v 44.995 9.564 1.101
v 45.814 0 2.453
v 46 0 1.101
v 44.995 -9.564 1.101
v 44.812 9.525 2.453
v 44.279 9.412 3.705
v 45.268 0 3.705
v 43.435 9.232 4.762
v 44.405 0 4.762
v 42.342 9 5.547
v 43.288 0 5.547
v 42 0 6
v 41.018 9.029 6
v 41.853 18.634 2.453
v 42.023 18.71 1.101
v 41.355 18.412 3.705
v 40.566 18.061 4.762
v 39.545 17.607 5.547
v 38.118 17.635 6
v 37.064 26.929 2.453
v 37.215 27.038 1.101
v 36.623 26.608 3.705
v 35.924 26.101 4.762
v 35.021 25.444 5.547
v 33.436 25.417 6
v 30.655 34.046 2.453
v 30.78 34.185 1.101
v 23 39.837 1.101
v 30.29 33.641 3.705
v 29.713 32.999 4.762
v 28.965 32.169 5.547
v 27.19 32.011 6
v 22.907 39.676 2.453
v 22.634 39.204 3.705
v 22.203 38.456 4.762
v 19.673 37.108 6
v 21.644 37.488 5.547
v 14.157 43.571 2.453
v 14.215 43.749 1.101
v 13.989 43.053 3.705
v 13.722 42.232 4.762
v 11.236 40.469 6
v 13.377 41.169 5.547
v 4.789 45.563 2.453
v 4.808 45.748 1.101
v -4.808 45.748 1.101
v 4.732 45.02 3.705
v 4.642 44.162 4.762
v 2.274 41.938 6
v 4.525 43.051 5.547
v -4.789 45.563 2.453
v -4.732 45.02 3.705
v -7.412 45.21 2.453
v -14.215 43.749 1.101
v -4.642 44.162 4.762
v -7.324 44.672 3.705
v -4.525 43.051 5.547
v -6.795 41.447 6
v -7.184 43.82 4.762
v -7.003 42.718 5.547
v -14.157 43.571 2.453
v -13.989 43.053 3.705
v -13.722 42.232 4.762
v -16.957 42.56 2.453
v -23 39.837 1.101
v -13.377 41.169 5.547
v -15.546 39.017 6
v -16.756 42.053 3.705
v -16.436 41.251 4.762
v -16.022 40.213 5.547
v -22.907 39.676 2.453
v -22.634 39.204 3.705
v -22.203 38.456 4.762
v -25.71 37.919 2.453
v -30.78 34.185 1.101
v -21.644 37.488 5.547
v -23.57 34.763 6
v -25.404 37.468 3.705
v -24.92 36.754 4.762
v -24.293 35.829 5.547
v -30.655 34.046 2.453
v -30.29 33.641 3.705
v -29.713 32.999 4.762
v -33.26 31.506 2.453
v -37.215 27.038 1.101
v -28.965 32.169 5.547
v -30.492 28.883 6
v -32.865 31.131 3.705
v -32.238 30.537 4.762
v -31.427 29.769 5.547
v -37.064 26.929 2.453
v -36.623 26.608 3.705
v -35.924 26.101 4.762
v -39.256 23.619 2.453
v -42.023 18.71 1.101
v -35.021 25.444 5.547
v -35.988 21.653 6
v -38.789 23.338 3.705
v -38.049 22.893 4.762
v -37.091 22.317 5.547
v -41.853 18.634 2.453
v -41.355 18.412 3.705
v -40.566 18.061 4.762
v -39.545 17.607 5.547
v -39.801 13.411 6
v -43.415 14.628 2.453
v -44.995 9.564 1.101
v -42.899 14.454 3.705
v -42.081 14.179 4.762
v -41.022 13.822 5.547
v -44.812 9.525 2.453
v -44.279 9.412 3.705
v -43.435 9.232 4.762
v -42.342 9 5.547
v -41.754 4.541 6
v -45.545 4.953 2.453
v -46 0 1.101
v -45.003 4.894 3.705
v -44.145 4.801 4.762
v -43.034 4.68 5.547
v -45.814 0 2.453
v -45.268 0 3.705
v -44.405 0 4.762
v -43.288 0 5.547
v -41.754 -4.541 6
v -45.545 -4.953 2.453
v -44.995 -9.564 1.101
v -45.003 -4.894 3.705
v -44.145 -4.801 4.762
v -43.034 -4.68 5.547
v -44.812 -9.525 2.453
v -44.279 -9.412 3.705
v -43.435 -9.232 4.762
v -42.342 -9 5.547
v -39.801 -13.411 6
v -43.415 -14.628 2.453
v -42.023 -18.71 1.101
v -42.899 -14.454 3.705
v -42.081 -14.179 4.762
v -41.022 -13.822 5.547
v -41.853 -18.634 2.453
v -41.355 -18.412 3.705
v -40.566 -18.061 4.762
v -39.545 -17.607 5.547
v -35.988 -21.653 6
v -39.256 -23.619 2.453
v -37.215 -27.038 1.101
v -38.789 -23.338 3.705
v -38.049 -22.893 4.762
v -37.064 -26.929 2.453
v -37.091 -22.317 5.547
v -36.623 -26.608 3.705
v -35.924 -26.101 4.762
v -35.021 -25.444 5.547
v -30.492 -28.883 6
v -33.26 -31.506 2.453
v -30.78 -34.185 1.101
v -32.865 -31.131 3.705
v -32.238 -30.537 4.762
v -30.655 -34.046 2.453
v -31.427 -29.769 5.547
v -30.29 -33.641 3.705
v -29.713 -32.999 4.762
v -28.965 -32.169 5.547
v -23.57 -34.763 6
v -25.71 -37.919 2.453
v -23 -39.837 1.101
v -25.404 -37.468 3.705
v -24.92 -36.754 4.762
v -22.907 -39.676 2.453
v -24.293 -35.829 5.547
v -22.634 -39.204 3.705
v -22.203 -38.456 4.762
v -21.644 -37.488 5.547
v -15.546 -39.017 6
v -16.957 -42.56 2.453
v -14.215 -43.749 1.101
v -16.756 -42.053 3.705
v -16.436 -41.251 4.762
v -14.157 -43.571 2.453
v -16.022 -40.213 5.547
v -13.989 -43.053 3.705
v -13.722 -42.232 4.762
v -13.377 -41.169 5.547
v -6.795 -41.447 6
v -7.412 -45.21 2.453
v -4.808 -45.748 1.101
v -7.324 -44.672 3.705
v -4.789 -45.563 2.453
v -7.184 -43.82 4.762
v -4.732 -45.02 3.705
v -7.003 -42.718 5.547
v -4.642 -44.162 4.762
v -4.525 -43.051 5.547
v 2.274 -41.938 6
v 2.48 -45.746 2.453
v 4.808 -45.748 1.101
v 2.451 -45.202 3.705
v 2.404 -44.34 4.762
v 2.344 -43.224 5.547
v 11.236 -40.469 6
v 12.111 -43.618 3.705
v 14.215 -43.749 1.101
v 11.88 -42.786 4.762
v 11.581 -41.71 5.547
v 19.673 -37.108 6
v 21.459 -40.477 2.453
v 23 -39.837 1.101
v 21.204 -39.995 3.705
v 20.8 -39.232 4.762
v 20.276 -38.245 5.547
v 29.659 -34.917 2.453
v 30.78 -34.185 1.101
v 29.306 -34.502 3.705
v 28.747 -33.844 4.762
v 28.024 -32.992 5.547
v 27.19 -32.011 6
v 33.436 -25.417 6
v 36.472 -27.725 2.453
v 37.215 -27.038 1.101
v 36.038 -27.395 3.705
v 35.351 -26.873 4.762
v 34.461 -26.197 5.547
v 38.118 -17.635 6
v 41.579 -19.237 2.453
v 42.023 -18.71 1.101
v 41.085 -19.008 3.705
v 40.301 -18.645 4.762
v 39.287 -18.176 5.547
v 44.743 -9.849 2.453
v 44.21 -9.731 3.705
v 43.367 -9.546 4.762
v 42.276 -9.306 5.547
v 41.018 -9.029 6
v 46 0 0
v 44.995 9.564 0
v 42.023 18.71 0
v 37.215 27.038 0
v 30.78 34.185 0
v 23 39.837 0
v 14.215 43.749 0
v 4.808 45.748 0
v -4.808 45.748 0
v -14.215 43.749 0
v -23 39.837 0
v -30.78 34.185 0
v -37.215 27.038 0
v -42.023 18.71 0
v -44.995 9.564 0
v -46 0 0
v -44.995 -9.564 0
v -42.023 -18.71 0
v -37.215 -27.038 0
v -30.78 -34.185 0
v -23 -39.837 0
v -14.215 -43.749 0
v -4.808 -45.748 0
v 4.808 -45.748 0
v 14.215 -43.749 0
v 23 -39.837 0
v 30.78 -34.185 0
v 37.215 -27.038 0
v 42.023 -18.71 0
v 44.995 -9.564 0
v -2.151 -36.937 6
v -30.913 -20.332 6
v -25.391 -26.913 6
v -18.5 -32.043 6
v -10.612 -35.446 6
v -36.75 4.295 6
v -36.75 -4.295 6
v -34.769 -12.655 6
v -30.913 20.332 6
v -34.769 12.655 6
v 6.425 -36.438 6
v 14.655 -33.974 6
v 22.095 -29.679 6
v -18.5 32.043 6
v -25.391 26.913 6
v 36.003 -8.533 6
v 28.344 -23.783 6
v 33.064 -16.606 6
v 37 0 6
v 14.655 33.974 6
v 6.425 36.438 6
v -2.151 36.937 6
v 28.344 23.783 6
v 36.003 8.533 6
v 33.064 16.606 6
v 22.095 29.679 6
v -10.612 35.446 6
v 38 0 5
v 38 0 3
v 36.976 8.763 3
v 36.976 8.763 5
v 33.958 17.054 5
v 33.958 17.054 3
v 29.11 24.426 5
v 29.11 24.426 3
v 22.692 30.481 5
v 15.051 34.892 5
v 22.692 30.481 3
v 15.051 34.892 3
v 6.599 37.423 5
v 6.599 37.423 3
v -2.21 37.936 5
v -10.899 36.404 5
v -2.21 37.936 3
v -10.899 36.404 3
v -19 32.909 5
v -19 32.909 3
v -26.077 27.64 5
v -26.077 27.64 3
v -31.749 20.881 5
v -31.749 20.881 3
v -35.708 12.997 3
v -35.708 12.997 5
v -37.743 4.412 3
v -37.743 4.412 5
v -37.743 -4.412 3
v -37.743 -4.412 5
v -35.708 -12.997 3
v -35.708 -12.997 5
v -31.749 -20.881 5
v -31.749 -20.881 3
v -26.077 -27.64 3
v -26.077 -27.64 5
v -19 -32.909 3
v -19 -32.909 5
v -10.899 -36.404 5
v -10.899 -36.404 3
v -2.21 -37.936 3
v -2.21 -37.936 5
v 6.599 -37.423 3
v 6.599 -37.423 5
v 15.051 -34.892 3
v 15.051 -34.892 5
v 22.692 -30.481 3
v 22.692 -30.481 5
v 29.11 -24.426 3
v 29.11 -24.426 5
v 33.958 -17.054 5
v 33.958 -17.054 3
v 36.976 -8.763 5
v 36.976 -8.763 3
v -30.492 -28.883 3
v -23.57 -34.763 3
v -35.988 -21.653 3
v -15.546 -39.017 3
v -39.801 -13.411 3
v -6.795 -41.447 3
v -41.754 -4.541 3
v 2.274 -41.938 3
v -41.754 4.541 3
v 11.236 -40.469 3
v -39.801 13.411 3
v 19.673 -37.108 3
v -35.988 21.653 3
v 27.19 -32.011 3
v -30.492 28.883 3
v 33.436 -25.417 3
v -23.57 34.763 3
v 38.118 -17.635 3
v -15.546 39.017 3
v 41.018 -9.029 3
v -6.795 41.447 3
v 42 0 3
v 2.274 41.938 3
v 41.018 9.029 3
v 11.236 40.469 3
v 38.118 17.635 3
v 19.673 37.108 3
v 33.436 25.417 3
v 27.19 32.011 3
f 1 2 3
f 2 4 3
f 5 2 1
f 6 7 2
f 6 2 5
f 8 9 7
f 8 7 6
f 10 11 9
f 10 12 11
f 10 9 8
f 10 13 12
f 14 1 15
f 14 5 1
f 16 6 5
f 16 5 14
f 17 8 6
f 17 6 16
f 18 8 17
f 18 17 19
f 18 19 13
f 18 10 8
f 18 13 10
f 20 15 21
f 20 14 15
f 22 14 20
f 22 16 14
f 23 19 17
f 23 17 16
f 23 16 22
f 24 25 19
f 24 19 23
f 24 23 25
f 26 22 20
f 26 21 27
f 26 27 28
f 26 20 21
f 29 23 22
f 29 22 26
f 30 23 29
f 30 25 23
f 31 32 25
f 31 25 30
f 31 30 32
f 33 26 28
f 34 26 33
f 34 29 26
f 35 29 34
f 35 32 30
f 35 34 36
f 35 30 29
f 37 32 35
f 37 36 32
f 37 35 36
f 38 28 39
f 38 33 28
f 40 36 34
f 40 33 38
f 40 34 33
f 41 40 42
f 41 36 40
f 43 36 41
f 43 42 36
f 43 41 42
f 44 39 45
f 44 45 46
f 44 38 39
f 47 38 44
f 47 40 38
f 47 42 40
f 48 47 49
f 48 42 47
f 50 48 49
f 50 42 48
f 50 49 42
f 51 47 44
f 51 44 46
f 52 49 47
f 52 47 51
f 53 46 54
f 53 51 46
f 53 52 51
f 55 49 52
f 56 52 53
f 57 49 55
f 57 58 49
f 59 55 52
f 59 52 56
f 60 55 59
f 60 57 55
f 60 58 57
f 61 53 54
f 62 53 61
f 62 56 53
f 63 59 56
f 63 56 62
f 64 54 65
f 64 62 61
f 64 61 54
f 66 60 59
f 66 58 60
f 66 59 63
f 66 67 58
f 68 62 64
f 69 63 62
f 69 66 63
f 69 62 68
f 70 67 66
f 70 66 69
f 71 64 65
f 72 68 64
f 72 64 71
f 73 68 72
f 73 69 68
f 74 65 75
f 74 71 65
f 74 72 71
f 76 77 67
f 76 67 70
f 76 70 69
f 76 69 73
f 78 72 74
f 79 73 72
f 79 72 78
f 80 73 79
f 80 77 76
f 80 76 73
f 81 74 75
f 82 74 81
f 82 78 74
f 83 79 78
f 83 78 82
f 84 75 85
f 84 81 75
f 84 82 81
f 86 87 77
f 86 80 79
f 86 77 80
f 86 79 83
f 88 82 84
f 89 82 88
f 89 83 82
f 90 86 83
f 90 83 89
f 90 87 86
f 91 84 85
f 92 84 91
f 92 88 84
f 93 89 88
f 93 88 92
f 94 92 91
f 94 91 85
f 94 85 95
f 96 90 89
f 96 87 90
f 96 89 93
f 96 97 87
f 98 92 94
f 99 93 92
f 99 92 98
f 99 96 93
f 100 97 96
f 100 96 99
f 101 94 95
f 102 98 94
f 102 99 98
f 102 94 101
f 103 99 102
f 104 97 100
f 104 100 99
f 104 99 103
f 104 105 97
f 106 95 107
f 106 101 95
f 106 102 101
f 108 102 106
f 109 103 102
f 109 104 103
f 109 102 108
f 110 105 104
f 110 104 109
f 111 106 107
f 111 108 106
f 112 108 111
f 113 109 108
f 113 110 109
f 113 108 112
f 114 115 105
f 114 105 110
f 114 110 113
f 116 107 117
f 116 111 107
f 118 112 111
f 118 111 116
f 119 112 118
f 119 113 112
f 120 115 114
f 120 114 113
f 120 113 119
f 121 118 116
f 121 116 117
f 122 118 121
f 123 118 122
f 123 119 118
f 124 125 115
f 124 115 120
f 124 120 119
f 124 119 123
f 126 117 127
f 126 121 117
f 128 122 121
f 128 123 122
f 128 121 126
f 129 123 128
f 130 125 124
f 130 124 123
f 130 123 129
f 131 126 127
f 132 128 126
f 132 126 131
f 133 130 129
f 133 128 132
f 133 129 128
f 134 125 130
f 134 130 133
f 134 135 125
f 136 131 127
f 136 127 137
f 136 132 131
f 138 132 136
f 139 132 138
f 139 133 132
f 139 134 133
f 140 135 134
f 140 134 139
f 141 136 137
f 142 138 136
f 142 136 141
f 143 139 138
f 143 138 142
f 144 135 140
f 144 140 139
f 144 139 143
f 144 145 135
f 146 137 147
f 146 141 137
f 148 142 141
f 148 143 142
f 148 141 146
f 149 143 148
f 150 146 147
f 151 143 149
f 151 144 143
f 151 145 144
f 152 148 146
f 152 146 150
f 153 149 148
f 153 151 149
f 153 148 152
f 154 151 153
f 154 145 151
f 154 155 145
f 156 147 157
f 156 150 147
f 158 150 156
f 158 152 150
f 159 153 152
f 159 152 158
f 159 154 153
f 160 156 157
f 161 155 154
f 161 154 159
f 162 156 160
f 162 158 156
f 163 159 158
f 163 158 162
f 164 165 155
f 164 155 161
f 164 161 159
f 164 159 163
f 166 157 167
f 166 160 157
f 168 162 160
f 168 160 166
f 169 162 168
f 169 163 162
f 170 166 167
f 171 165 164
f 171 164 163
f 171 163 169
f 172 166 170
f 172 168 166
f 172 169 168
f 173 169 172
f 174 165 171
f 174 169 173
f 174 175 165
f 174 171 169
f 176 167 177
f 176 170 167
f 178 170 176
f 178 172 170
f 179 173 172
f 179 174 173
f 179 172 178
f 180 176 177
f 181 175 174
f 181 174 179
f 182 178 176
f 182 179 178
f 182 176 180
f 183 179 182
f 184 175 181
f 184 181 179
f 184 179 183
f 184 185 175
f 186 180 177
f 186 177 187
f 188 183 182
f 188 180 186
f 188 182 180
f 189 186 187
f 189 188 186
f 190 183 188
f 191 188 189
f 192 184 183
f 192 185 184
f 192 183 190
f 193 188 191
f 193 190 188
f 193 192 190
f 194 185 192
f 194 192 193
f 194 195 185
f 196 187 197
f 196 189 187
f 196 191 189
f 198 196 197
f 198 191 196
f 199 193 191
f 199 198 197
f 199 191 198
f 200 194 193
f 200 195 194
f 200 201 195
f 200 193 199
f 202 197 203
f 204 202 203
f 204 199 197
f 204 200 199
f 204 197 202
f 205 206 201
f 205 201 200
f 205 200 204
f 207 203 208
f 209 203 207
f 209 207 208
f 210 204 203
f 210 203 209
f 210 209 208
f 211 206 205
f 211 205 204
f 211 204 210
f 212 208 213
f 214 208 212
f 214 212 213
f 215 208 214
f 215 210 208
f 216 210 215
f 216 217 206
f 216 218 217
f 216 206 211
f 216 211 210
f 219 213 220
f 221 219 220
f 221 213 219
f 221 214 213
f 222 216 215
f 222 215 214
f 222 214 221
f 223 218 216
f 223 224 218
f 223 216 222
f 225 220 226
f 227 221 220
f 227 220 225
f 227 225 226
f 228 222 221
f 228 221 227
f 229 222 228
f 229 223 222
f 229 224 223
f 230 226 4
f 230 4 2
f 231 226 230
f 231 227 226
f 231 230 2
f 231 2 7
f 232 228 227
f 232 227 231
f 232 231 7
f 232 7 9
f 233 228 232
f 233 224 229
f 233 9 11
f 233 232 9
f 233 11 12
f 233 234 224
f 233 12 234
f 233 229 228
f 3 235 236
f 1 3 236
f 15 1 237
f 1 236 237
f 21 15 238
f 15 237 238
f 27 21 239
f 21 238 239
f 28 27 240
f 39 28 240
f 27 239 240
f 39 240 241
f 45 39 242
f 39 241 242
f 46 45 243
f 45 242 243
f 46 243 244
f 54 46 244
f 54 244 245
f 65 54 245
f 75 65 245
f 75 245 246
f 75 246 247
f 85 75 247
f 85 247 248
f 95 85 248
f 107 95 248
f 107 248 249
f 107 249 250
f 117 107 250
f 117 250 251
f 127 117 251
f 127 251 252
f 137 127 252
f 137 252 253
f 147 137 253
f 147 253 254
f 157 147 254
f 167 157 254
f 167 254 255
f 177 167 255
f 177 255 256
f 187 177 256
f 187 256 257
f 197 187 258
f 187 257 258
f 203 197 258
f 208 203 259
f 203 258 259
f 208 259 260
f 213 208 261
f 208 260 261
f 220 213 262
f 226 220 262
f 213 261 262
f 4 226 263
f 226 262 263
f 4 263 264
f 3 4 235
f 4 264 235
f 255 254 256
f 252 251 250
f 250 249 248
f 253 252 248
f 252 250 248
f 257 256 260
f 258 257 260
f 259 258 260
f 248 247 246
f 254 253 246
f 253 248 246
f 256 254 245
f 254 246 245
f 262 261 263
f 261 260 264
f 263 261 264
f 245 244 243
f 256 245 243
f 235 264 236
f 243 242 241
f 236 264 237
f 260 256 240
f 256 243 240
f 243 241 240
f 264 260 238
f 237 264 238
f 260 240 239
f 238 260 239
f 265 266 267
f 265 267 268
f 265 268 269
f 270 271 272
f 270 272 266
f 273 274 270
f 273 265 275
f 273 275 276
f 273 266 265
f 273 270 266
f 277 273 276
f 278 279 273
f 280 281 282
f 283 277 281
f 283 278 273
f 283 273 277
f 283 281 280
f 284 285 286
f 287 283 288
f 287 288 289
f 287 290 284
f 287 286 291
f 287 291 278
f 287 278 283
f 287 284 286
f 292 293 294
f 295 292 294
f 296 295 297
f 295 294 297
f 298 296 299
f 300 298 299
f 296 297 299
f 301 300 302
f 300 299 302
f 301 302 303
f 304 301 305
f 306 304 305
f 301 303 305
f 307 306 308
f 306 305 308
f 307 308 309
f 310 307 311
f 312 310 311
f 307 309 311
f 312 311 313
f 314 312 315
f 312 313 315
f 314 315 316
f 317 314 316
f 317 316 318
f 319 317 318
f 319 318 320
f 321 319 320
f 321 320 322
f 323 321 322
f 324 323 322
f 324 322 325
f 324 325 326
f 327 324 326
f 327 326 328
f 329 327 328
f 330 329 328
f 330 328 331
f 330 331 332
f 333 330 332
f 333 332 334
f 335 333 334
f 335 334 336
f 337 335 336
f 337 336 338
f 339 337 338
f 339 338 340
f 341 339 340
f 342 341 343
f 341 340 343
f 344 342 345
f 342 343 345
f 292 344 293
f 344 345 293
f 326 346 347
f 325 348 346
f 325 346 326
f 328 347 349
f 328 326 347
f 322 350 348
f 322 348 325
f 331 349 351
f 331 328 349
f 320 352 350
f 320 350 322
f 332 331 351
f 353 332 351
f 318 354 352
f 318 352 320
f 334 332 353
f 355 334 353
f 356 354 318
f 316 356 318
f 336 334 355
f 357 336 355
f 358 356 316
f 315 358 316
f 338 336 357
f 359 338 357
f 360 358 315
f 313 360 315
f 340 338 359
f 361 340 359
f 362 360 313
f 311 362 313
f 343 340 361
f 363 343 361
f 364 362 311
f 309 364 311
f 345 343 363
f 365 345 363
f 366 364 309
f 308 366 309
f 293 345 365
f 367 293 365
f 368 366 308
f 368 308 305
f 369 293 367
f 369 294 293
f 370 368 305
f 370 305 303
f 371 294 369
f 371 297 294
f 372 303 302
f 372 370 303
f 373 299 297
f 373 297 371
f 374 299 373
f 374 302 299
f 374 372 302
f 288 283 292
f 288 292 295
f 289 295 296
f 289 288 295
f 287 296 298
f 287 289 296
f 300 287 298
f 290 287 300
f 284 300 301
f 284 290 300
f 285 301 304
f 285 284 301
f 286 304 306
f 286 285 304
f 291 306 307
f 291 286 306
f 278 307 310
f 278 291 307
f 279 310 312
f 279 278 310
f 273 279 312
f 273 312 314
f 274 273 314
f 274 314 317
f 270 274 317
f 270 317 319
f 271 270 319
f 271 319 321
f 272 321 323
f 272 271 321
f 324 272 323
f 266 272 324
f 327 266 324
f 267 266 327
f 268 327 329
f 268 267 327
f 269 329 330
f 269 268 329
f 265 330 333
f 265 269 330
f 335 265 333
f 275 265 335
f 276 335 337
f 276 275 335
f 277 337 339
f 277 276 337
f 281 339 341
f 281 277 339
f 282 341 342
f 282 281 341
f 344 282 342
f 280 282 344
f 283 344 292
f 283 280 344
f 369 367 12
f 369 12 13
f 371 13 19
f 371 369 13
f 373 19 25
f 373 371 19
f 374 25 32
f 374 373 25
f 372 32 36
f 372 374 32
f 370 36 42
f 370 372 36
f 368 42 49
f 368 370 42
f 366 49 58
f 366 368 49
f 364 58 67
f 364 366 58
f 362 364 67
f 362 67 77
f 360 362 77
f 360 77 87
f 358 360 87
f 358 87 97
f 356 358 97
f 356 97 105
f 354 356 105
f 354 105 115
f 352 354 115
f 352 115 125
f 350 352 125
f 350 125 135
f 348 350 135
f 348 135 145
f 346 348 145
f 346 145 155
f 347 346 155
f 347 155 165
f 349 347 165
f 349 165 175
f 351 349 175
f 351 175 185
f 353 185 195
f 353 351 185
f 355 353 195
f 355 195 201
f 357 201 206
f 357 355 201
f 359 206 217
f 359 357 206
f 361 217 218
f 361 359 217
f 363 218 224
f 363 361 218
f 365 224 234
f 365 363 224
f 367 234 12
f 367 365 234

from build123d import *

# Parameters (mm, degrees)
F0_R     = 46
F0_R_2   = 42
F0_R_3   = 38
F1_DEPTH = 3
F2_DEPTH = 6
F4_SIZE  = 1


# Not quite as in the source:
# - a fillet or chamfer that OpenCascade refuses, or shapes differently, is made with other operations: its cross-section is extruded or revolved along the edge and cut away or added


with BuildPart() as f1:
    # F0 (on Top) → F1 (new body)
    with BuildSketch(Plane.XY):
        Circle(F0_R)
        Circle(F0_R_2, mode=Mode.SUBTRACT)
        Circle(F0_R_2)
        Circle(F0_R_3, mode=Mode.SUBTRACT)
        Circle(F0_R_3)
    extrude(amount=F1_DEPTH)

    # F0 (on Top) → F2 (join)
    with BuildSketch(Plane.XY):
        Circle(F0_R)
        Circle(F0_R_2, mode=Mode.SUBTRACT)
        Circle(F0_R_3)
    extrude(amount=F2_DEPTH)

    # F3: fillet of radius 5 on 1 edges, made by hand

    # F3_s1 → F3_t2 (revolve, cut)
    with BuildSketch(Plane.XZ):
        with BuildLine():
            ThreePointArc((46, 1.1010205144), (44.8729833462, 4.2632981746), (42, 6))
            Line((42, 6), (46, 6))
            Line((46, 6), (46, 1.1010205144))
        make_face()
    revolve(axis=Axis((0, 0, 6), (0, 0, 1)), mode=Mode.SUBTRACT)

    # F4
    f4_edges = [f1.edges().sort_by_distance(p)[0] for p in [
        (-38, 0, 6),
    ]]
    chamfer(f4_edges, length=F4_SIZE)


solid = f1.part
